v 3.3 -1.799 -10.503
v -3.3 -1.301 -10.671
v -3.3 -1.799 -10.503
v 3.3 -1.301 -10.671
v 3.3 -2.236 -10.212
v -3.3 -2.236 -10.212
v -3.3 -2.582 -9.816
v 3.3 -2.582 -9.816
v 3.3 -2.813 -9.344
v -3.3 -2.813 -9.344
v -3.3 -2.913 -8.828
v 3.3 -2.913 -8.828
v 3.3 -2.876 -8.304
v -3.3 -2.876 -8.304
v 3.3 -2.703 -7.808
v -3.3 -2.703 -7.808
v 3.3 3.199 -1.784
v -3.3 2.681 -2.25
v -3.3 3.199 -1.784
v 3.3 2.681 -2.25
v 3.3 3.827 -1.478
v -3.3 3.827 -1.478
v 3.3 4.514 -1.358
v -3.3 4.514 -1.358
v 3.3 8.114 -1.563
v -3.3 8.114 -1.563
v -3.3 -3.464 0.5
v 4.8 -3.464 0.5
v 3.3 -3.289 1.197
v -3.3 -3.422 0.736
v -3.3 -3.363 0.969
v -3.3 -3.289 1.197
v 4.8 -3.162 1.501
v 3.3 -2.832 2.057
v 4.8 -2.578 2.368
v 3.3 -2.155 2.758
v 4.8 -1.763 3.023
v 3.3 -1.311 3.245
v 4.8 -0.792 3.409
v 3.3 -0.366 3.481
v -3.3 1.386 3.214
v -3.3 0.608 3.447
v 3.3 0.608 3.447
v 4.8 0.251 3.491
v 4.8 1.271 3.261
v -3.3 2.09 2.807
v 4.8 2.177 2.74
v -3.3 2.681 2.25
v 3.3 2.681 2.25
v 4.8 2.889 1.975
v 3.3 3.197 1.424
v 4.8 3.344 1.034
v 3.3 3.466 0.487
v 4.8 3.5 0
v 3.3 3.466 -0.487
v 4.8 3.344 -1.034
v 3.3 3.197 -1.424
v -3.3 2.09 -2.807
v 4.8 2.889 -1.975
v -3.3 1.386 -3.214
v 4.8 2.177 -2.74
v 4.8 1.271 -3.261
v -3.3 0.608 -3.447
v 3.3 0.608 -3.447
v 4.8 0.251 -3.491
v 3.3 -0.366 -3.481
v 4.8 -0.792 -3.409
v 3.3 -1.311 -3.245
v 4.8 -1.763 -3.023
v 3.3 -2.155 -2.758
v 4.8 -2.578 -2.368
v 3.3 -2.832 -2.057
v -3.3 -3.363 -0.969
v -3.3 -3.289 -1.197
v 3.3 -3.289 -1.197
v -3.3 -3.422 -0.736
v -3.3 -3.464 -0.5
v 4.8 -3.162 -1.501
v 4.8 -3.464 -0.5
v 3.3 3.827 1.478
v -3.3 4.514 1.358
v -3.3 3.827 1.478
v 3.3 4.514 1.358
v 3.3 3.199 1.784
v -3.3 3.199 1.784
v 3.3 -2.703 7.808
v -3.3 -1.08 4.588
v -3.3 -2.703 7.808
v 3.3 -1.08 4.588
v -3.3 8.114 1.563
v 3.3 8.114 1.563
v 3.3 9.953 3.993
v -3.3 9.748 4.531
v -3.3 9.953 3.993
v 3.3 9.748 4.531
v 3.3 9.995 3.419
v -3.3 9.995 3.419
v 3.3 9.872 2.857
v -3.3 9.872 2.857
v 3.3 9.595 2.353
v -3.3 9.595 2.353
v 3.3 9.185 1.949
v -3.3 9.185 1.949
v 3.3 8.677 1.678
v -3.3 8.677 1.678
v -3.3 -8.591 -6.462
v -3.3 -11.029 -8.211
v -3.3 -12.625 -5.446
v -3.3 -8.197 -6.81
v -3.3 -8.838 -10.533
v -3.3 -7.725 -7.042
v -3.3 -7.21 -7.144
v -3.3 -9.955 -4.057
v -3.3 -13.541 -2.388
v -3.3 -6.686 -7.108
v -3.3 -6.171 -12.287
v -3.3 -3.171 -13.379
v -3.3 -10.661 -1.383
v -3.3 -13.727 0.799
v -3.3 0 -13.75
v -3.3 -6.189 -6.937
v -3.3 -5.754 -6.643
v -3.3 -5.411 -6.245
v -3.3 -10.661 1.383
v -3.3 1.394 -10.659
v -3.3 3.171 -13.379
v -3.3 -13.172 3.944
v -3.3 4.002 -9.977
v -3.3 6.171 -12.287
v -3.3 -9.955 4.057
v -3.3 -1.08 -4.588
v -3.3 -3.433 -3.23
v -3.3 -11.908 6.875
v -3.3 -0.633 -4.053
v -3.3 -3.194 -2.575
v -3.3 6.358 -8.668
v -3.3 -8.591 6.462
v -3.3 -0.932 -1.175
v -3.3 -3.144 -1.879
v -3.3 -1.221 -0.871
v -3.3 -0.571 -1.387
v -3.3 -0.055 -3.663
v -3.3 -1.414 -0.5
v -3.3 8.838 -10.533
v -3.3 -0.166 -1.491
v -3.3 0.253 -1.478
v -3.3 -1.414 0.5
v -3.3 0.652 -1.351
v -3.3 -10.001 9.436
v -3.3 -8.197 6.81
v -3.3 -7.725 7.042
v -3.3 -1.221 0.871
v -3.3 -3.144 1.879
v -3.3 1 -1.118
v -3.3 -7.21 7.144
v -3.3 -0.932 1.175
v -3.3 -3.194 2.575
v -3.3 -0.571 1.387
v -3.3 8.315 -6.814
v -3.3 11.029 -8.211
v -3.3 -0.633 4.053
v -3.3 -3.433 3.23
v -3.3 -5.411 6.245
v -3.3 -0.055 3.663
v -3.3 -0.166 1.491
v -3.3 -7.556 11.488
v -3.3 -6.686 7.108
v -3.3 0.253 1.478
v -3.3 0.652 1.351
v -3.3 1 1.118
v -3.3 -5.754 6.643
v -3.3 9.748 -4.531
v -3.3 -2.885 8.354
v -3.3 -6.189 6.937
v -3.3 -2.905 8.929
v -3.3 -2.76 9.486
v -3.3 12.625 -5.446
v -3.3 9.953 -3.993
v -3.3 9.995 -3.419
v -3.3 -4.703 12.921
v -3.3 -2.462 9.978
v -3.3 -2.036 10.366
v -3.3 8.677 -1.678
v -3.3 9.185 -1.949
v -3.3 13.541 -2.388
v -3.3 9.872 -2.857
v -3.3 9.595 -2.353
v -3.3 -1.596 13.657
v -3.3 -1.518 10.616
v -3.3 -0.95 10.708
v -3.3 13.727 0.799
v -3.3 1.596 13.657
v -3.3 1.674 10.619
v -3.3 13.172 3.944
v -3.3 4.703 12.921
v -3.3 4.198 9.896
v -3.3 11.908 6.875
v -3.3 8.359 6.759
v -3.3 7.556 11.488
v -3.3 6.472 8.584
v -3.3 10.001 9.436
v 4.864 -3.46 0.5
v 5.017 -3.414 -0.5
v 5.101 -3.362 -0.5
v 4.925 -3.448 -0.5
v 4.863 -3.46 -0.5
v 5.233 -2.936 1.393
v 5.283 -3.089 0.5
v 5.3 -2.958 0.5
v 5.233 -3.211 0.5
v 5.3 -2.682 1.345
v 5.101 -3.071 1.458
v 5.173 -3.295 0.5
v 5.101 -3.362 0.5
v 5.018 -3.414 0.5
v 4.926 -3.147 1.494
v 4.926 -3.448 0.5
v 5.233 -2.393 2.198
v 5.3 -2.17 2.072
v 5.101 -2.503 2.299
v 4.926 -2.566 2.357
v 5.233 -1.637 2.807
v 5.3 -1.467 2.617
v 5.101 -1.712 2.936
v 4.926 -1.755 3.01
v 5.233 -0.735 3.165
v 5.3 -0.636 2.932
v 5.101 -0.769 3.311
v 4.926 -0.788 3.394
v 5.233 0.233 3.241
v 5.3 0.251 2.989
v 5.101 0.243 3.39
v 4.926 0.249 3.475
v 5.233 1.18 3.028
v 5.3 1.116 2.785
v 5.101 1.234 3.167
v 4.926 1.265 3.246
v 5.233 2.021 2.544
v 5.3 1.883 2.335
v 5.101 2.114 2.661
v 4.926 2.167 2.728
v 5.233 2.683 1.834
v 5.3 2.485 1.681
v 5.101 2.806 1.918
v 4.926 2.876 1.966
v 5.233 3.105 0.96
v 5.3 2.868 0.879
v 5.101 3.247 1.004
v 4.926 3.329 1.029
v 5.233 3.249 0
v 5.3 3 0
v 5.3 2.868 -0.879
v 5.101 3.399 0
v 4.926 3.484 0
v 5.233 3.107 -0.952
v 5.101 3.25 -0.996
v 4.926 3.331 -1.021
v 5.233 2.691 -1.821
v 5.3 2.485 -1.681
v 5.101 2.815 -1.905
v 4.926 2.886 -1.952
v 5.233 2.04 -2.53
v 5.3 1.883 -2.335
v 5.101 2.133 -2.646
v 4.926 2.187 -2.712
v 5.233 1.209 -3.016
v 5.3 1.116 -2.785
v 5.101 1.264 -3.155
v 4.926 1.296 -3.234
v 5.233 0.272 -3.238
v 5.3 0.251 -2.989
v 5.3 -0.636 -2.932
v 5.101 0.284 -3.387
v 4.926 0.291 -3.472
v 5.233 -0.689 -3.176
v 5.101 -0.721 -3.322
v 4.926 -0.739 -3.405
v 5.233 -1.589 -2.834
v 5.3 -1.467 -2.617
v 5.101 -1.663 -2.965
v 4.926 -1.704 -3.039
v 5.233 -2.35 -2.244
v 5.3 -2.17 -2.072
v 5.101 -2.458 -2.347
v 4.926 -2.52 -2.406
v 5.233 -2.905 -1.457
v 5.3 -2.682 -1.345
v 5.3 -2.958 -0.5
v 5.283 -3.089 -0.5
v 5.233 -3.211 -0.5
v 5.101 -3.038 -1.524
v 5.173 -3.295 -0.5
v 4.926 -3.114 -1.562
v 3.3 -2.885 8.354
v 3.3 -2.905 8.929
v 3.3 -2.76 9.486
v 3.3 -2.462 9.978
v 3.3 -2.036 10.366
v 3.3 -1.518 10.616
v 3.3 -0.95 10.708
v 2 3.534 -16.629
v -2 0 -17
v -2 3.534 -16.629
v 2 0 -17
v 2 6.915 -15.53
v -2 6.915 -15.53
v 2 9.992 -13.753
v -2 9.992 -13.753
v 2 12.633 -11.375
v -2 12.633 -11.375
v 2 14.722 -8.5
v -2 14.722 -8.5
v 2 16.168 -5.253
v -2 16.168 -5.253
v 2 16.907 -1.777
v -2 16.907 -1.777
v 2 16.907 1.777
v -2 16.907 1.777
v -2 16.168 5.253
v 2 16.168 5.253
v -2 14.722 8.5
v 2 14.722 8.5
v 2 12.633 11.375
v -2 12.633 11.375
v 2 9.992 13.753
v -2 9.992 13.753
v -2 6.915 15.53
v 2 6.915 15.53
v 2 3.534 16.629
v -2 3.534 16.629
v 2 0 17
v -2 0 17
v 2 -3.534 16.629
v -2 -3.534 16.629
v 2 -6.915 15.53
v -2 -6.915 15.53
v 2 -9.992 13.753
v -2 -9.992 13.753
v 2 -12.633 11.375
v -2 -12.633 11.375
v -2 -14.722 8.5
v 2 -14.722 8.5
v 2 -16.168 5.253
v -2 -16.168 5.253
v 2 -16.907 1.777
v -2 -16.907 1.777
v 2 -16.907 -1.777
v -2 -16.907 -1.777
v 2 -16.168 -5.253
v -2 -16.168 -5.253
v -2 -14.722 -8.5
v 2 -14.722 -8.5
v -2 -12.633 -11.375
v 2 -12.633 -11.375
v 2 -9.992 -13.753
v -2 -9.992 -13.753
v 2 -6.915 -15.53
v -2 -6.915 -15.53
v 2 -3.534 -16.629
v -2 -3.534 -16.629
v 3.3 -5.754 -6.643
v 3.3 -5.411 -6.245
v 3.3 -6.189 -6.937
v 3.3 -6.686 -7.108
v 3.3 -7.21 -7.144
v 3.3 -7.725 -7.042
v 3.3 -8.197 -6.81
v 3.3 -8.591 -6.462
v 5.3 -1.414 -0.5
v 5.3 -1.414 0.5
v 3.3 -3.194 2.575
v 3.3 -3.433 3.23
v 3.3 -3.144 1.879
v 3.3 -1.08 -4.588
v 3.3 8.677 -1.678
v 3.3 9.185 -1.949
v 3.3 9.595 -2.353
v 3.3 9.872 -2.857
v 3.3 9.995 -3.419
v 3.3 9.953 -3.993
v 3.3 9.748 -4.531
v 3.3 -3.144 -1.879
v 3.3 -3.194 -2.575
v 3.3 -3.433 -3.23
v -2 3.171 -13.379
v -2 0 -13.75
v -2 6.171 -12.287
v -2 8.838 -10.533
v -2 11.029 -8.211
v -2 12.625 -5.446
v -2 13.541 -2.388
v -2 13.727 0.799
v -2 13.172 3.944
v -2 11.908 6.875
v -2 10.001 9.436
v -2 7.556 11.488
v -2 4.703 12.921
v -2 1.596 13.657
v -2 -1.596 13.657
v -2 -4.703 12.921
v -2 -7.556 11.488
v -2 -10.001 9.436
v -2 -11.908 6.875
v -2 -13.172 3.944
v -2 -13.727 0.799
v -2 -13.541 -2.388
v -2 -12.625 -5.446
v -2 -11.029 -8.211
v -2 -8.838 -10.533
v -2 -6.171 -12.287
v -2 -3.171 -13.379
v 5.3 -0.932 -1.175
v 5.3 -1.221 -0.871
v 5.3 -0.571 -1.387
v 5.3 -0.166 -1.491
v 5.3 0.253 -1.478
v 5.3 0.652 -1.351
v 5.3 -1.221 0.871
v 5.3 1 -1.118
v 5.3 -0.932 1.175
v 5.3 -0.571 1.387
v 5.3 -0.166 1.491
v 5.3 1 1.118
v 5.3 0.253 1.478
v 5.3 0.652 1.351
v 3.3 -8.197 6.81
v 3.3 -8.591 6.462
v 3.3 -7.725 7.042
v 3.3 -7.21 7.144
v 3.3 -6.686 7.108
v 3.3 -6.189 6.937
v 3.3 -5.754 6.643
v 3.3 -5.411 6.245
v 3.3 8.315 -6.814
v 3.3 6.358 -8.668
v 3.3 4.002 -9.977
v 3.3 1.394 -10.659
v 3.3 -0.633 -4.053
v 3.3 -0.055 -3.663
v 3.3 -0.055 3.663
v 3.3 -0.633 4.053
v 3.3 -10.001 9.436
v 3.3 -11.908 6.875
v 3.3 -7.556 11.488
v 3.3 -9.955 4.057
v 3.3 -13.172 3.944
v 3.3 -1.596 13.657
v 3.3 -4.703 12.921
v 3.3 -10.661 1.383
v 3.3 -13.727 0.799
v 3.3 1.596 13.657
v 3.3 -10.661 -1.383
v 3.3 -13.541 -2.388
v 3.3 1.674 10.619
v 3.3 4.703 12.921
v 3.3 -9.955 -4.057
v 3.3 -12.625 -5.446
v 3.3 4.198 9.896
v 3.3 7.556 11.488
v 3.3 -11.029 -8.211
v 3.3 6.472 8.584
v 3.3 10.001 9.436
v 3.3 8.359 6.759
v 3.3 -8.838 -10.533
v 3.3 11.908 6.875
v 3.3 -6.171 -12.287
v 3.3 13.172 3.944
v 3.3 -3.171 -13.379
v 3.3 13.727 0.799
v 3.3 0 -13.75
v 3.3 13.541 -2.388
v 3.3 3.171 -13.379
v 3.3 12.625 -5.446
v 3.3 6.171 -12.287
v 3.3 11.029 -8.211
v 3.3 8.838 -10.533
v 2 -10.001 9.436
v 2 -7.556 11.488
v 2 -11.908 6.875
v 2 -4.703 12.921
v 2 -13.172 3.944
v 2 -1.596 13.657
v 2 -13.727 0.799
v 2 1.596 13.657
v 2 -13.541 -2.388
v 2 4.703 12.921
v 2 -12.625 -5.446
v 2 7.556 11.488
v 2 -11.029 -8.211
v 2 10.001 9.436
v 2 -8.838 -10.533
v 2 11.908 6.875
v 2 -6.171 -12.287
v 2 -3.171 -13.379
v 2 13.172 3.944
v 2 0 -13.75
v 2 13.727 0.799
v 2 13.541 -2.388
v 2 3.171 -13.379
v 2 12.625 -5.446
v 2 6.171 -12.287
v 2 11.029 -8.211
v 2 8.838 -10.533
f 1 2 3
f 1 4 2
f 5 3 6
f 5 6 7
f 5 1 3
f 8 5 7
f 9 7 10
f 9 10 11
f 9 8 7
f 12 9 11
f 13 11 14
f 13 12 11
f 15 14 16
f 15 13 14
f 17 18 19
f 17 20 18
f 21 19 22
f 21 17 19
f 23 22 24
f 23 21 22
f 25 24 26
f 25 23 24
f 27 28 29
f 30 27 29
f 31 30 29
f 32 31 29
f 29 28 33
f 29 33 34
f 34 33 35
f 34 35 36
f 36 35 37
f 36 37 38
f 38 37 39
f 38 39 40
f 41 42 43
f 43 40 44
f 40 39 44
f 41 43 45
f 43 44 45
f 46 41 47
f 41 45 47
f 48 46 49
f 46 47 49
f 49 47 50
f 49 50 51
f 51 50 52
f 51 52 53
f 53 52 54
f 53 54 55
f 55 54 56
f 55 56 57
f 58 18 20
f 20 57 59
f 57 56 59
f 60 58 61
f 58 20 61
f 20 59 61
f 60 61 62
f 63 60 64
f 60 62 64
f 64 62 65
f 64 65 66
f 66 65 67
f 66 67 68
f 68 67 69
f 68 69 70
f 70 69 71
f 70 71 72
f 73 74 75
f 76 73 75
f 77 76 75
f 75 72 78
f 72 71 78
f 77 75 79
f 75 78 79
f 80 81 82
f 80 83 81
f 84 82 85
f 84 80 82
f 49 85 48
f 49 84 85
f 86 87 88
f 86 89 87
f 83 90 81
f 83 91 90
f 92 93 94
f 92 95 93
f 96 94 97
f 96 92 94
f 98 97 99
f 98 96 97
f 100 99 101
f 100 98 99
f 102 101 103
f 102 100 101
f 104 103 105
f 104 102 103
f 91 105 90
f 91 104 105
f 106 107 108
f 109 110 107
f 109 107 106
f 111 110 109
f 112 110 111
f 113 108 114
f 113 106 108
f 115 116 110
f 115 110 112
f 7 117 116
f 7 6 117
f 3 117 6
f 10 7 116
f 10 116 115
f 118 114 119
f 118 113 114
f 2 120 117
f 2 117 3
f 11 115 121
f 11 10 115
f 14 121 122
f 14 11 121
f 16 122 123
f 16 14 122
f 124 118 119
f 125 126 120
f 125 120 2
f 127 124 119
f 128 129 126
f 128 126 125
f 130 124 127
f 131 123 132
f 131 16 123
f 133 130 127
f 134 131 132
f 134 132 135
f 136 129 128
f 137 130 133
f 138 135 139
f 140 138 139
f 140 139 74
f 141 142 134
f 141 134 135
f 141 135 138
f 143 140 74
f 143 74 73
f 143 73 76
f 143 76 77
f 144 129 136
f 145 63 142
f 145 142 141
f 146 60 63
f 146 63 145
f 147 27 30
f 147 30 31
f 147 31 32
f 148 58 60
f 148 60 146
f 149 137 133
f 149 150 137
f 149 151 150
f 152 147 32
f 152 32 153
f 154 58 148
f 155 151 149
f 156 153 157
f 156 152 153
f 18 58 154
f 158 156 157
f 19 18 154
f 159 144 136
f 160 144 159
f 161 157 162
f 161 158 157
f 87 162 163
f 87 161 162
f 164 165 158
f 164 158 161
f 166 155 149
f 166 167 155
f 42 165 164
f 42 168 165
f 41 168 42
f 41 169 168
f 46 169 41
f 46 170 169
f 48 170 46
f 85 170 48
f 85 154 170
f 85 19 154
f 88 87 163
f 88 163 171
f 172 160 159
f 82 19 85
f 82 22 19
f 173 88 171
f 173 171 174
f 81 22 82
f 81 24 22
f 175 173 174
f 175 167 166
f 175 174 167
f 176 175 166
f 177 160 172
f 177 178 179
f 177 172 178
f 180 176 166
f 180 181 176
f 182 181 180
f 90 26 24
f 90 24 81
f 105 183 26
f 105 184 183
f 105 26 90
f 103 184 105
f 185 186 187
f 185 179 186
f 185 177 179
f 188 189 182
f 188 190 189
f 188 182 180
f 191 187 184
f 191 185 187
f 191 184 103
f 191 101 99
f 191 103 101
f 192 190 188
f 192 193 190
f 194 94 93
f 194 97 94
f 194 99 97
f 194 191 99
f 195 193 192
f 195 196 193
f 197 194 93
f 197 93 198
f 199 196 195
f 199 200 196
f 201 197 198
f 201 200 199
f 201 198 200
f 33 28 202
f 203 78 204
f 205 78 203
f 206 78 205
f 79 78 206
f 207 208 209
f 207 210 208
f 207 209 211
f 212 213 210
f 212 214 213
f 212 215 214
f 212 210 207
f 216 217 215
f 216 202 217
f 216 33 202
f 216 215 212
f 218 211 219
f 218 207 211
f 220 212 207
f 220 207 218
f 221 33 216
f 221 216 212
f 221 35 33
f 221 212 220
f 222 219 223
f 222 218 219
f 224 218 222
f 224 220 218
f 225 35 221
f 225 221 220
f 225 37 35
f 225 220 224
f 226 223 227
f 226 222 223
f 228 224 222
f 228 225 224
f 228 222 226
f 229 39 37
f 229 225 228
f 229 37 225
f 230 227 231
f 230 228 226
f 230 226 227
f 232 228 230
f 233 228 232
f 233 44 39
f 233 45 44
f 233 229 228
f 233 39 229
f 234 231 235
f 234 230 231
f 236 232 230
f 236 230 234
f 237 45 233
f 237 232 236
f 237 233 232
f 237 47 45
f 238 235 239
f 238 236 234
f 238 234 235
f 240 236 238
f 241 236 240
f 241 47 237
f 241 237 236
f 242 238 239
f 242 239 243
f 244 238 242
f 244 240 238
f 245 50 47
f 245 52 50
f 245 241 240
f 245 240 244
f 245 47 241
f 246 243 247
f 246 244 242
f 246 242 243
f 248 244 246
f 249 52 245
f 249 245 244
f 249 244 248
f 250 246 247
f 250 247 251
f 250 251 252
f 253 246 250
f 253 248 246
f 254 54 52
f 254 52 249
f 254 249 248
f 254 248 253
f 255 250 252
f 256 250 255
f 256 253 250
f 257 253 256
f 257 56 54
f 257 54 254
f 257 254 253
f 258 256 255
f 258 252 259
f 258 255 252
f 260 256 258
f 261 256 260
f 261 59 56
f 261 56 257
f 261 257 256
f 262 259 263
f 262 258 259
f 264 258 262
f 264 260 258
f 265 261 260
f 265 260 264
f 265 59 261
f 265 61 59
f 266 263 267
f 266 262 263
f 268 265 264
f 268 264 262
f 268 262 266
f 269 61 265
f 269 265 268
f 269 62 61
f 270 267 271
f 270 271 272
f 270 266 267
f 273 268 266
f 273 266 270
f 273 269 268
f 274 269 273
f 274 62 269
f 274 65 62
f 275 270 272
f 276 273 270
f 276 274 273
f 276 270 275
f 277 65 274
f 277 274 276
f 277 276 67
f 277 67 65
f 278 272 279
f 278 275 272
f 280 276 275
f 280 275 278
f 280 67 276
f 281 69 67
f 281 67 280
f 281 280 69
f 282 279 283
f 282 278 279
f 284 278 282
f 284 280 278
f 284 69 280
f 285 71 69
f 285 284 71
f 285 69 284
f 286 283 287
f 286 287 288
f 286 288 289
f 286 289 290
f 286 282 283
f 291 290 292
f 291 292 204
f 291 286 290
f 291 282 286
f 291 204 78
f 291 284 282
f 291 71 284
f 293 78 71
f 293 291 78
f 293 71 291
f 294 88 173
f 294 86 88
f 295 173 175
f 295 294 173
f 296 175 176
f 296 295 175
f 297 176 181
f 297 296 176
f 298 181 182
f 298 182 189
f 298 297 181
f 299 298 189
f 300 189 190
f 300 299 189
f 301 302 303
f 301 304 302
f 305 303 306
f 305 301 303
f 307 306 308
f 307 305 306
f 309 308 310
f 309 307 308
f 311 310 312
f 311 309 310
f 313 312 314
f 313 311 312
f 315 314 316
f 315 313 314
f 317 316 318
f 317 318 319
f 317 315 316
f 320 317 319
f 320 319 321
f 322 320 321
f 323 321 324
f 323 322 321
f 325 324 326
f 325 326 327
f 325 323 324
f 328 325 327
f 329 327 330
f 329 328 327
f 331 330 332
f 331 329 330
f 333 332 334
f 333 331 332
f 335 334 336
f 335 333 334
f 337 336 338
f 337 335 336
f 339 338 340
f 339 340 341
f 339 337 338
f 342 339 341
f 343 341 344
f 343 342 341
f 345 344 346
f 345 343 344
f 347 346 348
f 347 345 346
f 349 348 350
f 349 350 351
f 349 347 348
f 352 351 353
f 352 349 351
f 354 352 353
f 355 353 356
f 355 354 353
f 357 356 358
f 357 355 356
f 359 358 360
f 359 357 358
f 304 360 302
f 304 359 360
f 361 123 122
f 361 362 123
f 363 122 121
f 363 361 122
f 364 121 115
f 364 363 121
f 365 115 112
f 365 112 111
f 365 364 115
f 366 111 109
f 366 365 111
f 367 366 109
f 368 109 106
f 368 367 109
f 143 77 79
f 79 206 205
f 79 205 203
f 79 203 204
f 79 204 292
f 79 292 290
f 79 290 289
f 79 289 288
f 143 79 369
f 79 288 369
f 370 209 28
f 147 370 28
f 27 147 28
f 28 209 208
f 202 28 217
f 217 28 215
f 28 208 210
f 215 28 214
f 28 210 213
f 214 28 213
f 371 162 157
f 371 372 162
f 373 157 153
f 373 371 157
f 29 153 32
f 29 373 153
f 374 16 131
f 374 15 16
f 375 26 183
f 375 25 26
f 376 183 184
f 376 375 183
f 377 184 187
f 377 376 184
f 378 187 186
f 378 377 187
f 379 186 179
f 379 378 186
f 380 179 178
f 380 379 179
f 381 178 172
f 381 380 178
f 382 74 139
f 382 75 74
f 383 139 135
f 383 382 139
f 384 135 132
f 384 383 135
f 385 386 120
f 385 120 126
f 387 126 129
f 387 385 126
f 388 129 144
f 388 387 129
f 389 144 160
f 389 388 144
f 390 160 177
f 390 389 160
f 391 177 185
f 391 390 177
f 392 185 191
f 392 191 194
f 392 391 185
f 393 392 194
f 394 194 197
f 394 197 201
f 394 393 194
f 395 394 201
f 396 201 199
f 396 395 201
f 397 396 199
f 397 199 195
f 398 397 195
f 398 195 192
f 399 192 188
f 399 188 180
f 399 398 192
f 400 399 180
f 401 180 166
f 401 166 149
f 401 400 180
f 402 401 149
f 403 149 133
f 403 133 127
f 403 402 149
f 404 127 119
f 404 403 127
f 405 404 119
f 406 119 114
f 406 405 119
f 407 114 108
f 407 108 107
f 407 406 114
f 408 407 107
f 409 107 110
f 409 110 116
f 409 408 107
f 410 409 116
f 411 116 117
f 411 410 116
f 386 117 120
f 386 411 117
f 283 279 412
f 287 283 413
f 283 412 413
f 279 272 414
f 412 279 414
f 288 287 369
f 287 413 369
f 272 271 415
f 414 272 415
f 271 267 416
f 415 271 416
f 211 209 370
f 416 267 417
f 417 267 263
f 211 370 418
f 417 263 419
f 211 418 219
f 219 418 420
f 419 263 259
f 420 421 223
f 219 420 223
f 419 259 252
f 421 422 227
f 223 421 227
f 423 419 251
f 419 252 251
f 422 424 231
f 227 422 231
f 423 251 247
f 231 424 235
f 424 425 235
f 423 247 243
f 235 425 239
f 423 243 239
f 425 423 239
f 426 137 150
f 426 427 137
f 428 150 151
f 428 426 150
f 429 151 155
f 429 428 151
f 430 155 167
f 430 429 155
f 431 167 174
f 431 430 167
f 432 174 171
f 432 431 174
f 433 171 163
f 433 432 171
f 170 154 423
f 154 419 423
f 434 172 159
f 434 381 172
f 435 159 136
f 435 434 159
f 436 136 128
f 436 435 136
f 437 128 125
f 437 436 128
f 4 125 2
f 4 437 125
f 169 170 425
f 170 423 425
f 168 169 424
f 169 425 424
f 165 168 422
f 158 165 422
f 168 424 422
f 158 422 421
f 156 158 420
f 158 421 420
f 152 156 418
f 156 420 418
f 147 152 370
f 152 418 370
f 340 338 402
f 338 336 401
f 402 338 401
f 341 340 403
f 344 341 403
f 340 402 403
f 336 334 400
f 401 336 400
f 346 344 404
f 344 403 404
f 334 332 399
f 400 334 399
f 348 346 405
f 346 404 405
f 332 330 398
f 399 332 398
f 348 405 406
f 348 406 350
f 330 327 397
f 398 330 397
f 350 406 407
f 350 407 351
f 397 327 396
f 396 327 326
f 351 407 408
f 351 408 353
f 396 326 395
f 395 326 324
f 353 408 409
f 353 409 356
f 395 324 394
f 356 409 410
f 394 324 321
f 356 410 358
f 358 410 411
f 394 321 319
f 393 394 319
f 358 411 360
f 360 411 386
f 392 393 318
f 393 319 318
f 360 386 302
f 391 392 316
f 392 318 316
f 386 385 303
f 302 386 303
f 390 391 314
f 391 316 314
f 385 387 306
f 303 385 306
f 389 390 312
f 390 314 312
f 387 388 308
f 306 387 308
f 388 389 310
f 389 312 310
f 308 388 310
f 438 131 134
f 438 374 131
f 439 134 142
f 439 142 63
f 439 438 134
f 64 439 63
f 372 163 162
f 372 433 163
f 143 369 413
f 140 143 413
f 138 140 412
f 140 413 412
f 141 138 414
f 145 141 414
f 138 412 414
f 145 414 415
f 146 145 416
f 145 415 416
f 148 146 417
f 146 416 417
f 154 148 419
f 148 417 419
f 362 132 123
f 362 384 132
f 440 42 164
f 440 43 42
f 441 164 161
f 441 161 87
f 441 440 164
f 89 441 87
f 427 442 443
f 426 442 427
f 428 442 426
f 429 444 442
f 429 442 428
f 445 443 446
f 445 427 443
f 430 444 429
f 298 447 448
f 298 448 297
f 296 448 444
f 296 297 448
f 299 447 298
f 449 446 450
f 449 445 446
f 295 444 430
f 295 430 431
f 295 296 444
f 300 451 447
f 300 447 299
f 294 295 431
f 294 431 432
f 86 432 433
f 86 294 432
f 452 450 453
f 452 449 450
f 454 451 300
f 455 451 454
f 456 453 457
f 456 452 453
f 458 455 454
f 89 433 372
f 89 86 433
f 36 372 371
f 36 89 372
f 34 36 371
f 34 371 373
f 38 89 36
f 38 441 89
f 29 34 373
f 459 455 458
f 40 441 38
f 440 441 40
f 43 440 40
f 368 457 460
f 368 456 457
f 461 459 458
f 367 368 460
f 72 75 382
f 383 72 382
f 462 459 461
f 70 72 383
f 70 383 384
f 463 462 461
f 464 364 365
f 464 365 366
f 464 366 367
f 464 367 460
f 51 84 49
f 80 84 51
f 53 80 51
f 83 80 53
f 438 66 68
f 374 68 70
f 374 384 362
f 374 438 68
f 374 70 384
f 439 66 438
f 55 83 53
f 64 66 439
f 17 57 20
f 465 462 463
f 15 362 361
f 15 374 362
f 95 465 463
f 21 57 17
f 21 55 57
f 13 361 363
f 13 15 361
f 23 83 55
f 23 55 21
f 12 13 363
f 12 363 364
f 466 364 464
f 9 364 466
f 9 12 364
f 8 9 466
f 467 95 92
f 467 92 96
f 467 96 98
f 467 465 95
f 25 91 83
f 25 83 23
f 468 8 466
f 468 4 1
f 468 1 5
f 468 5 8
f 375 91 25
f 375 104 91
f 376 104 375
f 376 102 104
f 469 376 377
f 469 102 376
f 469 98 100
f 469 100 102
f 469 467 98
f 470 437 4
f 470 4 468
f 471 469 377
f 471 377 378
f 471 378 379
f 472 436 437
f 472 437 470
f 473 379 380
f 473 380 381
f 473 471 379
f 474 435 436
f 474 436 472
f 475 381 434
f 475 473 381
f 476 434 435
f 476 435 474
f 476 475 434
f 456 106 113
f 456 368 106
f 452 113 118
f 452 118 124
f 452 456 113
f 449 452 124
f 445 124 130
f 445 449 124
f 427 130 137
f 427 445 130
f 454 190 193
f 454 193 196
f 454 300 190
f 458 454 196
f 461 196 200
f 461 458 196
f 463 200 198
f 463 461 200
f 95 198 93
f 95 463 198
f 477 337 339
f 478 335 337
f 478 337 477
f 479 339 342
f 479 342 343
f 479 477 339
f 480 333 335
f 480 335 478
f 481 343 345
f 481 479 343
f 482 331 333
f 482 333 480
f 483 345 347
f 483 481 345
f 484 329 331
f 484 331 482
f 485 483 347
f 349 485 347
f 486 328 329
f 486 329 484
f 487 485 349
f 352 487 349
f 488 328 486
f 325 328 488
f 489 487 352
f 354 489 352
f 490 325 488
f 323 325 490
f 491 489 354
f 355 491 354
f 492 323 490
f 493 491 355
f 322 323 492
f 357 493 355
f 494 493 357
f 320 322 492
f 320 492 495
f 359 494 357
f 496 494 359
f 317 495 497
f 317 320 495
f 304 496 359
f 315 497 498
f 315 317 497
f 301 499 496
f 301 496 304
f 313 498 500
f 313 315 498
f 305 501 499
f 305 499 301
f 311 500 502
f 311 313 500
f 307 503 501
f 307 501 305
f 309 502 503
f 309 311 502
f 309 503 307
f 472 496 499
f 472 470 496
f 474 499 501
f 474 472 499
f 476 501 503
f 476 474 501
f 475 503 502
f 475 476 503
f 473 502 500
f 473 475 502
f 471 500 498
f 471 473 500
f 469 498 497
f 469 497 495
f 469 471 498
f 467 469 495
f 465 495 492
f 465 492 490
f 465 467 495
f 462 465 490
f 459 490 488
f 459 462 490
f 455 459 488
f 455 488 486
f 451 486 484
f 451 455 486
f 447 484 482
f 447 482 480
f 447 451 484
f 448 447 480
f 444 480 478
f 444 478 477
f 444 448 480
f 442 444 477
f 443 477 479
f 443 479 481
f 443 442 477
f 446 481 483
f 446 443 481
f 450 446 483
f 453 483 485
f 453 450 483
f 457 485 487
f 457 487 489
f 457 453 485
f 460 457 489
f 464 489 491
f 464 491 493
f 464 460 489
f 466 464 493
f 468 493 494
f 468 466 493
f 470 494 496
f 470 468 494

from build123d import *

# Parameters (mm, degrees)
RESSALTO_EXTRUS_O1_DEPTH      = 5.3
RESSALTO_EXTRUS_O1_DEPTH_BACK = 3.3
ESBO_O1_3_R                   = 13.75
RESSALTO_EXTRUS_O2_DEPTH      = 3.3
FILETE2_R                     = 0.5
ESBO_O2_R                     = 17
ESBO_O2_R_2                   = 13.75
RESSALTO_EXTRUS_O3_DEPTH      = 2


with BuildPart() as part:
    # Esbo_o1 → Ressalto-extrus_o1 (new body, two sides)
    with BuildSketch(Plane(origin=(0, 0, 0), x_dir=(0, 0, -1), z_dir=(1, 0, 0))) as ressalto_extrus_o1_sk:
        with BuildLine():
            ThreePointArc((0.5, -1.414213562), (1.4531398, -0.37200097), (1.118033989, 1))
            Line((1.118033989, 1), (-1.118033989, 1))
            ThreePointArc((-1.118033989, 1), (-1.4531398, -0.37200097), (-0.5, -1.414213562))
            Line((-0.5, -1.414213562), (-0.5, -3.464101615))
            ThreePointArc((-0.5, -3.464101615), (0, 3.5), (0.5, -3.464101615))
            Line((0.5, -3.464101615), (0.5, -1.414213562))
        make_face()
    extrude(amount=RESSALTO_EXTRUS_O1_DEPTH)
    extrude(ressalto_extrus_o1_sk.sketch, amount=-RESSALTO_EXTRUS_O1_DEPTH_BACK)

    # Esbo_o1_3 → Ressalto-extrus_o2 (add, symmetric)
    with BuildSketch(Plane(origin=(0, 0, 0), x_dir=(0, 0, -1), z_dir=(1, 0, 0))):
        Circle(ESBO_O1_3_R)
        with BuildLine():
            ThreePointArc((3.446771953, 0.608081497), (3.031088913, -1.75), (1.196771953, -3.28903282))
            ThreePointArc((1.196771953, -3.28903282), (2.228560776, -3.144612223), (3.229618168, -3.433280857))
            Line((3.229618168, -3.433280857), (6.244929793, -5.410607922))
            ThreePointArc((6.244929793, -5.410607922), (7.143531761, -6.946693722), (6.462297299, -8.590763273))
            ThreePointArc((6.462297299, -8.590763273), (0, -10.75), (-6.462297299, -8.590763273))
            ThreePointArc((-6.462297299, -8.590763273), (-7.143531761, -6.946693722), (-6.244929793, -5.410607922))
            Line((-6.244929793, -5.410607922), (-3.229618168, -3.433280857))
            ThreePointArc((-3.229618168, -3.433280857), (-2.228560776, -3.144612223), (-1.196771953, -3.28903282))
            ThreePointArc((-1.196771953, -3.28903282), (-3.031088913, -1.75), (-3.446771953, 0.608081497))
            ThreePointArc((-3.446771953, 0.608081497), (-3.837594458, -0.357684134), (-4.588117525, -1.08029095))
            Line((-4.588117525, -1.08029095), (-7.808188807, -2.702963885))
            ThreePointArc((-7.808188807, -2.702963885), (-9.742921821, -2.628468224), (-10.707946608, -0.949936544))
            ThreePointArc((-10.707946608, -0.949936544), (-9.309773091, 5.375), (-4.531304125, 9.748322057))
            ThreePointArc((-4.531304125, 9.748322057), (-2.595140656, 9.751851916), (-1.563259014, 8.113571807))
            Line((-1.563259014, 8.113571807), (-1.358499357, 4.513571807))
            ThreePointArc((-1.358499357, 4.513571807), (-1.609033682, 3.502296357), (-2.25, 2.680951324))
            ThreePointArc((-2.25, 2.680951324), (0, 3.5), (2.25, 2.680951324))
            ThreePointArc((2.25, 2.680951324), (1.609033682, 3.502296357), (1.358499357, 4.513571807))
            Line((1.358499357, 4.513571807), (1.563259014, 8.113571807))
            ThreePointArc((1.563259014, 8.113571807), (2.595140656, 9.751851916), (4.531304125, 9.748322057))
            ThreePointArc((4.531304125, 9.748322057), (9.396801436, 5.221362156), (10.670967882, -1.301131991))
            ThreePointArc((10.670967882, -1.301131991), (9.587779116, -2.713133117), (7.808188807, -2.702963885))
            Line((7.808188807, -2.702963885), (4.588117525, -1.08029095))
            ThreePointArc((4.588117525, -1.08029095), (3.837594458, -0.357684134), (3.446771953, 0.608081497))
        make_face(mode=Mode.SUBTRACT)
    extrude(amount=RESSALTO_EXTRUS_O2_DEPTH, both=True)

    # Filete2
    filete2_edges = [part.edges().sort_by_distance(p)[0] for p in [
        (5.3, 3.5, 0),
    ]]
    fillet(filete2_edges, radius=FILETE2_R)

    # Esbo_o2 → Ressalto-extrus_o3 (add, symmetric)
    with BuildSketch(Plane(origin=(0, 0, 0), x_dir=(0, 0, -1), z_dir=(1, 0, 0))):
        Circle(ESBO_O2_R)
        Circle(ESBO_O2_R_2, mode=Mode.SUBTRACT)
    extrude(amount=RESSALTO_EXTRUS_O3_DEPTH, both=True)


solid = part.part
